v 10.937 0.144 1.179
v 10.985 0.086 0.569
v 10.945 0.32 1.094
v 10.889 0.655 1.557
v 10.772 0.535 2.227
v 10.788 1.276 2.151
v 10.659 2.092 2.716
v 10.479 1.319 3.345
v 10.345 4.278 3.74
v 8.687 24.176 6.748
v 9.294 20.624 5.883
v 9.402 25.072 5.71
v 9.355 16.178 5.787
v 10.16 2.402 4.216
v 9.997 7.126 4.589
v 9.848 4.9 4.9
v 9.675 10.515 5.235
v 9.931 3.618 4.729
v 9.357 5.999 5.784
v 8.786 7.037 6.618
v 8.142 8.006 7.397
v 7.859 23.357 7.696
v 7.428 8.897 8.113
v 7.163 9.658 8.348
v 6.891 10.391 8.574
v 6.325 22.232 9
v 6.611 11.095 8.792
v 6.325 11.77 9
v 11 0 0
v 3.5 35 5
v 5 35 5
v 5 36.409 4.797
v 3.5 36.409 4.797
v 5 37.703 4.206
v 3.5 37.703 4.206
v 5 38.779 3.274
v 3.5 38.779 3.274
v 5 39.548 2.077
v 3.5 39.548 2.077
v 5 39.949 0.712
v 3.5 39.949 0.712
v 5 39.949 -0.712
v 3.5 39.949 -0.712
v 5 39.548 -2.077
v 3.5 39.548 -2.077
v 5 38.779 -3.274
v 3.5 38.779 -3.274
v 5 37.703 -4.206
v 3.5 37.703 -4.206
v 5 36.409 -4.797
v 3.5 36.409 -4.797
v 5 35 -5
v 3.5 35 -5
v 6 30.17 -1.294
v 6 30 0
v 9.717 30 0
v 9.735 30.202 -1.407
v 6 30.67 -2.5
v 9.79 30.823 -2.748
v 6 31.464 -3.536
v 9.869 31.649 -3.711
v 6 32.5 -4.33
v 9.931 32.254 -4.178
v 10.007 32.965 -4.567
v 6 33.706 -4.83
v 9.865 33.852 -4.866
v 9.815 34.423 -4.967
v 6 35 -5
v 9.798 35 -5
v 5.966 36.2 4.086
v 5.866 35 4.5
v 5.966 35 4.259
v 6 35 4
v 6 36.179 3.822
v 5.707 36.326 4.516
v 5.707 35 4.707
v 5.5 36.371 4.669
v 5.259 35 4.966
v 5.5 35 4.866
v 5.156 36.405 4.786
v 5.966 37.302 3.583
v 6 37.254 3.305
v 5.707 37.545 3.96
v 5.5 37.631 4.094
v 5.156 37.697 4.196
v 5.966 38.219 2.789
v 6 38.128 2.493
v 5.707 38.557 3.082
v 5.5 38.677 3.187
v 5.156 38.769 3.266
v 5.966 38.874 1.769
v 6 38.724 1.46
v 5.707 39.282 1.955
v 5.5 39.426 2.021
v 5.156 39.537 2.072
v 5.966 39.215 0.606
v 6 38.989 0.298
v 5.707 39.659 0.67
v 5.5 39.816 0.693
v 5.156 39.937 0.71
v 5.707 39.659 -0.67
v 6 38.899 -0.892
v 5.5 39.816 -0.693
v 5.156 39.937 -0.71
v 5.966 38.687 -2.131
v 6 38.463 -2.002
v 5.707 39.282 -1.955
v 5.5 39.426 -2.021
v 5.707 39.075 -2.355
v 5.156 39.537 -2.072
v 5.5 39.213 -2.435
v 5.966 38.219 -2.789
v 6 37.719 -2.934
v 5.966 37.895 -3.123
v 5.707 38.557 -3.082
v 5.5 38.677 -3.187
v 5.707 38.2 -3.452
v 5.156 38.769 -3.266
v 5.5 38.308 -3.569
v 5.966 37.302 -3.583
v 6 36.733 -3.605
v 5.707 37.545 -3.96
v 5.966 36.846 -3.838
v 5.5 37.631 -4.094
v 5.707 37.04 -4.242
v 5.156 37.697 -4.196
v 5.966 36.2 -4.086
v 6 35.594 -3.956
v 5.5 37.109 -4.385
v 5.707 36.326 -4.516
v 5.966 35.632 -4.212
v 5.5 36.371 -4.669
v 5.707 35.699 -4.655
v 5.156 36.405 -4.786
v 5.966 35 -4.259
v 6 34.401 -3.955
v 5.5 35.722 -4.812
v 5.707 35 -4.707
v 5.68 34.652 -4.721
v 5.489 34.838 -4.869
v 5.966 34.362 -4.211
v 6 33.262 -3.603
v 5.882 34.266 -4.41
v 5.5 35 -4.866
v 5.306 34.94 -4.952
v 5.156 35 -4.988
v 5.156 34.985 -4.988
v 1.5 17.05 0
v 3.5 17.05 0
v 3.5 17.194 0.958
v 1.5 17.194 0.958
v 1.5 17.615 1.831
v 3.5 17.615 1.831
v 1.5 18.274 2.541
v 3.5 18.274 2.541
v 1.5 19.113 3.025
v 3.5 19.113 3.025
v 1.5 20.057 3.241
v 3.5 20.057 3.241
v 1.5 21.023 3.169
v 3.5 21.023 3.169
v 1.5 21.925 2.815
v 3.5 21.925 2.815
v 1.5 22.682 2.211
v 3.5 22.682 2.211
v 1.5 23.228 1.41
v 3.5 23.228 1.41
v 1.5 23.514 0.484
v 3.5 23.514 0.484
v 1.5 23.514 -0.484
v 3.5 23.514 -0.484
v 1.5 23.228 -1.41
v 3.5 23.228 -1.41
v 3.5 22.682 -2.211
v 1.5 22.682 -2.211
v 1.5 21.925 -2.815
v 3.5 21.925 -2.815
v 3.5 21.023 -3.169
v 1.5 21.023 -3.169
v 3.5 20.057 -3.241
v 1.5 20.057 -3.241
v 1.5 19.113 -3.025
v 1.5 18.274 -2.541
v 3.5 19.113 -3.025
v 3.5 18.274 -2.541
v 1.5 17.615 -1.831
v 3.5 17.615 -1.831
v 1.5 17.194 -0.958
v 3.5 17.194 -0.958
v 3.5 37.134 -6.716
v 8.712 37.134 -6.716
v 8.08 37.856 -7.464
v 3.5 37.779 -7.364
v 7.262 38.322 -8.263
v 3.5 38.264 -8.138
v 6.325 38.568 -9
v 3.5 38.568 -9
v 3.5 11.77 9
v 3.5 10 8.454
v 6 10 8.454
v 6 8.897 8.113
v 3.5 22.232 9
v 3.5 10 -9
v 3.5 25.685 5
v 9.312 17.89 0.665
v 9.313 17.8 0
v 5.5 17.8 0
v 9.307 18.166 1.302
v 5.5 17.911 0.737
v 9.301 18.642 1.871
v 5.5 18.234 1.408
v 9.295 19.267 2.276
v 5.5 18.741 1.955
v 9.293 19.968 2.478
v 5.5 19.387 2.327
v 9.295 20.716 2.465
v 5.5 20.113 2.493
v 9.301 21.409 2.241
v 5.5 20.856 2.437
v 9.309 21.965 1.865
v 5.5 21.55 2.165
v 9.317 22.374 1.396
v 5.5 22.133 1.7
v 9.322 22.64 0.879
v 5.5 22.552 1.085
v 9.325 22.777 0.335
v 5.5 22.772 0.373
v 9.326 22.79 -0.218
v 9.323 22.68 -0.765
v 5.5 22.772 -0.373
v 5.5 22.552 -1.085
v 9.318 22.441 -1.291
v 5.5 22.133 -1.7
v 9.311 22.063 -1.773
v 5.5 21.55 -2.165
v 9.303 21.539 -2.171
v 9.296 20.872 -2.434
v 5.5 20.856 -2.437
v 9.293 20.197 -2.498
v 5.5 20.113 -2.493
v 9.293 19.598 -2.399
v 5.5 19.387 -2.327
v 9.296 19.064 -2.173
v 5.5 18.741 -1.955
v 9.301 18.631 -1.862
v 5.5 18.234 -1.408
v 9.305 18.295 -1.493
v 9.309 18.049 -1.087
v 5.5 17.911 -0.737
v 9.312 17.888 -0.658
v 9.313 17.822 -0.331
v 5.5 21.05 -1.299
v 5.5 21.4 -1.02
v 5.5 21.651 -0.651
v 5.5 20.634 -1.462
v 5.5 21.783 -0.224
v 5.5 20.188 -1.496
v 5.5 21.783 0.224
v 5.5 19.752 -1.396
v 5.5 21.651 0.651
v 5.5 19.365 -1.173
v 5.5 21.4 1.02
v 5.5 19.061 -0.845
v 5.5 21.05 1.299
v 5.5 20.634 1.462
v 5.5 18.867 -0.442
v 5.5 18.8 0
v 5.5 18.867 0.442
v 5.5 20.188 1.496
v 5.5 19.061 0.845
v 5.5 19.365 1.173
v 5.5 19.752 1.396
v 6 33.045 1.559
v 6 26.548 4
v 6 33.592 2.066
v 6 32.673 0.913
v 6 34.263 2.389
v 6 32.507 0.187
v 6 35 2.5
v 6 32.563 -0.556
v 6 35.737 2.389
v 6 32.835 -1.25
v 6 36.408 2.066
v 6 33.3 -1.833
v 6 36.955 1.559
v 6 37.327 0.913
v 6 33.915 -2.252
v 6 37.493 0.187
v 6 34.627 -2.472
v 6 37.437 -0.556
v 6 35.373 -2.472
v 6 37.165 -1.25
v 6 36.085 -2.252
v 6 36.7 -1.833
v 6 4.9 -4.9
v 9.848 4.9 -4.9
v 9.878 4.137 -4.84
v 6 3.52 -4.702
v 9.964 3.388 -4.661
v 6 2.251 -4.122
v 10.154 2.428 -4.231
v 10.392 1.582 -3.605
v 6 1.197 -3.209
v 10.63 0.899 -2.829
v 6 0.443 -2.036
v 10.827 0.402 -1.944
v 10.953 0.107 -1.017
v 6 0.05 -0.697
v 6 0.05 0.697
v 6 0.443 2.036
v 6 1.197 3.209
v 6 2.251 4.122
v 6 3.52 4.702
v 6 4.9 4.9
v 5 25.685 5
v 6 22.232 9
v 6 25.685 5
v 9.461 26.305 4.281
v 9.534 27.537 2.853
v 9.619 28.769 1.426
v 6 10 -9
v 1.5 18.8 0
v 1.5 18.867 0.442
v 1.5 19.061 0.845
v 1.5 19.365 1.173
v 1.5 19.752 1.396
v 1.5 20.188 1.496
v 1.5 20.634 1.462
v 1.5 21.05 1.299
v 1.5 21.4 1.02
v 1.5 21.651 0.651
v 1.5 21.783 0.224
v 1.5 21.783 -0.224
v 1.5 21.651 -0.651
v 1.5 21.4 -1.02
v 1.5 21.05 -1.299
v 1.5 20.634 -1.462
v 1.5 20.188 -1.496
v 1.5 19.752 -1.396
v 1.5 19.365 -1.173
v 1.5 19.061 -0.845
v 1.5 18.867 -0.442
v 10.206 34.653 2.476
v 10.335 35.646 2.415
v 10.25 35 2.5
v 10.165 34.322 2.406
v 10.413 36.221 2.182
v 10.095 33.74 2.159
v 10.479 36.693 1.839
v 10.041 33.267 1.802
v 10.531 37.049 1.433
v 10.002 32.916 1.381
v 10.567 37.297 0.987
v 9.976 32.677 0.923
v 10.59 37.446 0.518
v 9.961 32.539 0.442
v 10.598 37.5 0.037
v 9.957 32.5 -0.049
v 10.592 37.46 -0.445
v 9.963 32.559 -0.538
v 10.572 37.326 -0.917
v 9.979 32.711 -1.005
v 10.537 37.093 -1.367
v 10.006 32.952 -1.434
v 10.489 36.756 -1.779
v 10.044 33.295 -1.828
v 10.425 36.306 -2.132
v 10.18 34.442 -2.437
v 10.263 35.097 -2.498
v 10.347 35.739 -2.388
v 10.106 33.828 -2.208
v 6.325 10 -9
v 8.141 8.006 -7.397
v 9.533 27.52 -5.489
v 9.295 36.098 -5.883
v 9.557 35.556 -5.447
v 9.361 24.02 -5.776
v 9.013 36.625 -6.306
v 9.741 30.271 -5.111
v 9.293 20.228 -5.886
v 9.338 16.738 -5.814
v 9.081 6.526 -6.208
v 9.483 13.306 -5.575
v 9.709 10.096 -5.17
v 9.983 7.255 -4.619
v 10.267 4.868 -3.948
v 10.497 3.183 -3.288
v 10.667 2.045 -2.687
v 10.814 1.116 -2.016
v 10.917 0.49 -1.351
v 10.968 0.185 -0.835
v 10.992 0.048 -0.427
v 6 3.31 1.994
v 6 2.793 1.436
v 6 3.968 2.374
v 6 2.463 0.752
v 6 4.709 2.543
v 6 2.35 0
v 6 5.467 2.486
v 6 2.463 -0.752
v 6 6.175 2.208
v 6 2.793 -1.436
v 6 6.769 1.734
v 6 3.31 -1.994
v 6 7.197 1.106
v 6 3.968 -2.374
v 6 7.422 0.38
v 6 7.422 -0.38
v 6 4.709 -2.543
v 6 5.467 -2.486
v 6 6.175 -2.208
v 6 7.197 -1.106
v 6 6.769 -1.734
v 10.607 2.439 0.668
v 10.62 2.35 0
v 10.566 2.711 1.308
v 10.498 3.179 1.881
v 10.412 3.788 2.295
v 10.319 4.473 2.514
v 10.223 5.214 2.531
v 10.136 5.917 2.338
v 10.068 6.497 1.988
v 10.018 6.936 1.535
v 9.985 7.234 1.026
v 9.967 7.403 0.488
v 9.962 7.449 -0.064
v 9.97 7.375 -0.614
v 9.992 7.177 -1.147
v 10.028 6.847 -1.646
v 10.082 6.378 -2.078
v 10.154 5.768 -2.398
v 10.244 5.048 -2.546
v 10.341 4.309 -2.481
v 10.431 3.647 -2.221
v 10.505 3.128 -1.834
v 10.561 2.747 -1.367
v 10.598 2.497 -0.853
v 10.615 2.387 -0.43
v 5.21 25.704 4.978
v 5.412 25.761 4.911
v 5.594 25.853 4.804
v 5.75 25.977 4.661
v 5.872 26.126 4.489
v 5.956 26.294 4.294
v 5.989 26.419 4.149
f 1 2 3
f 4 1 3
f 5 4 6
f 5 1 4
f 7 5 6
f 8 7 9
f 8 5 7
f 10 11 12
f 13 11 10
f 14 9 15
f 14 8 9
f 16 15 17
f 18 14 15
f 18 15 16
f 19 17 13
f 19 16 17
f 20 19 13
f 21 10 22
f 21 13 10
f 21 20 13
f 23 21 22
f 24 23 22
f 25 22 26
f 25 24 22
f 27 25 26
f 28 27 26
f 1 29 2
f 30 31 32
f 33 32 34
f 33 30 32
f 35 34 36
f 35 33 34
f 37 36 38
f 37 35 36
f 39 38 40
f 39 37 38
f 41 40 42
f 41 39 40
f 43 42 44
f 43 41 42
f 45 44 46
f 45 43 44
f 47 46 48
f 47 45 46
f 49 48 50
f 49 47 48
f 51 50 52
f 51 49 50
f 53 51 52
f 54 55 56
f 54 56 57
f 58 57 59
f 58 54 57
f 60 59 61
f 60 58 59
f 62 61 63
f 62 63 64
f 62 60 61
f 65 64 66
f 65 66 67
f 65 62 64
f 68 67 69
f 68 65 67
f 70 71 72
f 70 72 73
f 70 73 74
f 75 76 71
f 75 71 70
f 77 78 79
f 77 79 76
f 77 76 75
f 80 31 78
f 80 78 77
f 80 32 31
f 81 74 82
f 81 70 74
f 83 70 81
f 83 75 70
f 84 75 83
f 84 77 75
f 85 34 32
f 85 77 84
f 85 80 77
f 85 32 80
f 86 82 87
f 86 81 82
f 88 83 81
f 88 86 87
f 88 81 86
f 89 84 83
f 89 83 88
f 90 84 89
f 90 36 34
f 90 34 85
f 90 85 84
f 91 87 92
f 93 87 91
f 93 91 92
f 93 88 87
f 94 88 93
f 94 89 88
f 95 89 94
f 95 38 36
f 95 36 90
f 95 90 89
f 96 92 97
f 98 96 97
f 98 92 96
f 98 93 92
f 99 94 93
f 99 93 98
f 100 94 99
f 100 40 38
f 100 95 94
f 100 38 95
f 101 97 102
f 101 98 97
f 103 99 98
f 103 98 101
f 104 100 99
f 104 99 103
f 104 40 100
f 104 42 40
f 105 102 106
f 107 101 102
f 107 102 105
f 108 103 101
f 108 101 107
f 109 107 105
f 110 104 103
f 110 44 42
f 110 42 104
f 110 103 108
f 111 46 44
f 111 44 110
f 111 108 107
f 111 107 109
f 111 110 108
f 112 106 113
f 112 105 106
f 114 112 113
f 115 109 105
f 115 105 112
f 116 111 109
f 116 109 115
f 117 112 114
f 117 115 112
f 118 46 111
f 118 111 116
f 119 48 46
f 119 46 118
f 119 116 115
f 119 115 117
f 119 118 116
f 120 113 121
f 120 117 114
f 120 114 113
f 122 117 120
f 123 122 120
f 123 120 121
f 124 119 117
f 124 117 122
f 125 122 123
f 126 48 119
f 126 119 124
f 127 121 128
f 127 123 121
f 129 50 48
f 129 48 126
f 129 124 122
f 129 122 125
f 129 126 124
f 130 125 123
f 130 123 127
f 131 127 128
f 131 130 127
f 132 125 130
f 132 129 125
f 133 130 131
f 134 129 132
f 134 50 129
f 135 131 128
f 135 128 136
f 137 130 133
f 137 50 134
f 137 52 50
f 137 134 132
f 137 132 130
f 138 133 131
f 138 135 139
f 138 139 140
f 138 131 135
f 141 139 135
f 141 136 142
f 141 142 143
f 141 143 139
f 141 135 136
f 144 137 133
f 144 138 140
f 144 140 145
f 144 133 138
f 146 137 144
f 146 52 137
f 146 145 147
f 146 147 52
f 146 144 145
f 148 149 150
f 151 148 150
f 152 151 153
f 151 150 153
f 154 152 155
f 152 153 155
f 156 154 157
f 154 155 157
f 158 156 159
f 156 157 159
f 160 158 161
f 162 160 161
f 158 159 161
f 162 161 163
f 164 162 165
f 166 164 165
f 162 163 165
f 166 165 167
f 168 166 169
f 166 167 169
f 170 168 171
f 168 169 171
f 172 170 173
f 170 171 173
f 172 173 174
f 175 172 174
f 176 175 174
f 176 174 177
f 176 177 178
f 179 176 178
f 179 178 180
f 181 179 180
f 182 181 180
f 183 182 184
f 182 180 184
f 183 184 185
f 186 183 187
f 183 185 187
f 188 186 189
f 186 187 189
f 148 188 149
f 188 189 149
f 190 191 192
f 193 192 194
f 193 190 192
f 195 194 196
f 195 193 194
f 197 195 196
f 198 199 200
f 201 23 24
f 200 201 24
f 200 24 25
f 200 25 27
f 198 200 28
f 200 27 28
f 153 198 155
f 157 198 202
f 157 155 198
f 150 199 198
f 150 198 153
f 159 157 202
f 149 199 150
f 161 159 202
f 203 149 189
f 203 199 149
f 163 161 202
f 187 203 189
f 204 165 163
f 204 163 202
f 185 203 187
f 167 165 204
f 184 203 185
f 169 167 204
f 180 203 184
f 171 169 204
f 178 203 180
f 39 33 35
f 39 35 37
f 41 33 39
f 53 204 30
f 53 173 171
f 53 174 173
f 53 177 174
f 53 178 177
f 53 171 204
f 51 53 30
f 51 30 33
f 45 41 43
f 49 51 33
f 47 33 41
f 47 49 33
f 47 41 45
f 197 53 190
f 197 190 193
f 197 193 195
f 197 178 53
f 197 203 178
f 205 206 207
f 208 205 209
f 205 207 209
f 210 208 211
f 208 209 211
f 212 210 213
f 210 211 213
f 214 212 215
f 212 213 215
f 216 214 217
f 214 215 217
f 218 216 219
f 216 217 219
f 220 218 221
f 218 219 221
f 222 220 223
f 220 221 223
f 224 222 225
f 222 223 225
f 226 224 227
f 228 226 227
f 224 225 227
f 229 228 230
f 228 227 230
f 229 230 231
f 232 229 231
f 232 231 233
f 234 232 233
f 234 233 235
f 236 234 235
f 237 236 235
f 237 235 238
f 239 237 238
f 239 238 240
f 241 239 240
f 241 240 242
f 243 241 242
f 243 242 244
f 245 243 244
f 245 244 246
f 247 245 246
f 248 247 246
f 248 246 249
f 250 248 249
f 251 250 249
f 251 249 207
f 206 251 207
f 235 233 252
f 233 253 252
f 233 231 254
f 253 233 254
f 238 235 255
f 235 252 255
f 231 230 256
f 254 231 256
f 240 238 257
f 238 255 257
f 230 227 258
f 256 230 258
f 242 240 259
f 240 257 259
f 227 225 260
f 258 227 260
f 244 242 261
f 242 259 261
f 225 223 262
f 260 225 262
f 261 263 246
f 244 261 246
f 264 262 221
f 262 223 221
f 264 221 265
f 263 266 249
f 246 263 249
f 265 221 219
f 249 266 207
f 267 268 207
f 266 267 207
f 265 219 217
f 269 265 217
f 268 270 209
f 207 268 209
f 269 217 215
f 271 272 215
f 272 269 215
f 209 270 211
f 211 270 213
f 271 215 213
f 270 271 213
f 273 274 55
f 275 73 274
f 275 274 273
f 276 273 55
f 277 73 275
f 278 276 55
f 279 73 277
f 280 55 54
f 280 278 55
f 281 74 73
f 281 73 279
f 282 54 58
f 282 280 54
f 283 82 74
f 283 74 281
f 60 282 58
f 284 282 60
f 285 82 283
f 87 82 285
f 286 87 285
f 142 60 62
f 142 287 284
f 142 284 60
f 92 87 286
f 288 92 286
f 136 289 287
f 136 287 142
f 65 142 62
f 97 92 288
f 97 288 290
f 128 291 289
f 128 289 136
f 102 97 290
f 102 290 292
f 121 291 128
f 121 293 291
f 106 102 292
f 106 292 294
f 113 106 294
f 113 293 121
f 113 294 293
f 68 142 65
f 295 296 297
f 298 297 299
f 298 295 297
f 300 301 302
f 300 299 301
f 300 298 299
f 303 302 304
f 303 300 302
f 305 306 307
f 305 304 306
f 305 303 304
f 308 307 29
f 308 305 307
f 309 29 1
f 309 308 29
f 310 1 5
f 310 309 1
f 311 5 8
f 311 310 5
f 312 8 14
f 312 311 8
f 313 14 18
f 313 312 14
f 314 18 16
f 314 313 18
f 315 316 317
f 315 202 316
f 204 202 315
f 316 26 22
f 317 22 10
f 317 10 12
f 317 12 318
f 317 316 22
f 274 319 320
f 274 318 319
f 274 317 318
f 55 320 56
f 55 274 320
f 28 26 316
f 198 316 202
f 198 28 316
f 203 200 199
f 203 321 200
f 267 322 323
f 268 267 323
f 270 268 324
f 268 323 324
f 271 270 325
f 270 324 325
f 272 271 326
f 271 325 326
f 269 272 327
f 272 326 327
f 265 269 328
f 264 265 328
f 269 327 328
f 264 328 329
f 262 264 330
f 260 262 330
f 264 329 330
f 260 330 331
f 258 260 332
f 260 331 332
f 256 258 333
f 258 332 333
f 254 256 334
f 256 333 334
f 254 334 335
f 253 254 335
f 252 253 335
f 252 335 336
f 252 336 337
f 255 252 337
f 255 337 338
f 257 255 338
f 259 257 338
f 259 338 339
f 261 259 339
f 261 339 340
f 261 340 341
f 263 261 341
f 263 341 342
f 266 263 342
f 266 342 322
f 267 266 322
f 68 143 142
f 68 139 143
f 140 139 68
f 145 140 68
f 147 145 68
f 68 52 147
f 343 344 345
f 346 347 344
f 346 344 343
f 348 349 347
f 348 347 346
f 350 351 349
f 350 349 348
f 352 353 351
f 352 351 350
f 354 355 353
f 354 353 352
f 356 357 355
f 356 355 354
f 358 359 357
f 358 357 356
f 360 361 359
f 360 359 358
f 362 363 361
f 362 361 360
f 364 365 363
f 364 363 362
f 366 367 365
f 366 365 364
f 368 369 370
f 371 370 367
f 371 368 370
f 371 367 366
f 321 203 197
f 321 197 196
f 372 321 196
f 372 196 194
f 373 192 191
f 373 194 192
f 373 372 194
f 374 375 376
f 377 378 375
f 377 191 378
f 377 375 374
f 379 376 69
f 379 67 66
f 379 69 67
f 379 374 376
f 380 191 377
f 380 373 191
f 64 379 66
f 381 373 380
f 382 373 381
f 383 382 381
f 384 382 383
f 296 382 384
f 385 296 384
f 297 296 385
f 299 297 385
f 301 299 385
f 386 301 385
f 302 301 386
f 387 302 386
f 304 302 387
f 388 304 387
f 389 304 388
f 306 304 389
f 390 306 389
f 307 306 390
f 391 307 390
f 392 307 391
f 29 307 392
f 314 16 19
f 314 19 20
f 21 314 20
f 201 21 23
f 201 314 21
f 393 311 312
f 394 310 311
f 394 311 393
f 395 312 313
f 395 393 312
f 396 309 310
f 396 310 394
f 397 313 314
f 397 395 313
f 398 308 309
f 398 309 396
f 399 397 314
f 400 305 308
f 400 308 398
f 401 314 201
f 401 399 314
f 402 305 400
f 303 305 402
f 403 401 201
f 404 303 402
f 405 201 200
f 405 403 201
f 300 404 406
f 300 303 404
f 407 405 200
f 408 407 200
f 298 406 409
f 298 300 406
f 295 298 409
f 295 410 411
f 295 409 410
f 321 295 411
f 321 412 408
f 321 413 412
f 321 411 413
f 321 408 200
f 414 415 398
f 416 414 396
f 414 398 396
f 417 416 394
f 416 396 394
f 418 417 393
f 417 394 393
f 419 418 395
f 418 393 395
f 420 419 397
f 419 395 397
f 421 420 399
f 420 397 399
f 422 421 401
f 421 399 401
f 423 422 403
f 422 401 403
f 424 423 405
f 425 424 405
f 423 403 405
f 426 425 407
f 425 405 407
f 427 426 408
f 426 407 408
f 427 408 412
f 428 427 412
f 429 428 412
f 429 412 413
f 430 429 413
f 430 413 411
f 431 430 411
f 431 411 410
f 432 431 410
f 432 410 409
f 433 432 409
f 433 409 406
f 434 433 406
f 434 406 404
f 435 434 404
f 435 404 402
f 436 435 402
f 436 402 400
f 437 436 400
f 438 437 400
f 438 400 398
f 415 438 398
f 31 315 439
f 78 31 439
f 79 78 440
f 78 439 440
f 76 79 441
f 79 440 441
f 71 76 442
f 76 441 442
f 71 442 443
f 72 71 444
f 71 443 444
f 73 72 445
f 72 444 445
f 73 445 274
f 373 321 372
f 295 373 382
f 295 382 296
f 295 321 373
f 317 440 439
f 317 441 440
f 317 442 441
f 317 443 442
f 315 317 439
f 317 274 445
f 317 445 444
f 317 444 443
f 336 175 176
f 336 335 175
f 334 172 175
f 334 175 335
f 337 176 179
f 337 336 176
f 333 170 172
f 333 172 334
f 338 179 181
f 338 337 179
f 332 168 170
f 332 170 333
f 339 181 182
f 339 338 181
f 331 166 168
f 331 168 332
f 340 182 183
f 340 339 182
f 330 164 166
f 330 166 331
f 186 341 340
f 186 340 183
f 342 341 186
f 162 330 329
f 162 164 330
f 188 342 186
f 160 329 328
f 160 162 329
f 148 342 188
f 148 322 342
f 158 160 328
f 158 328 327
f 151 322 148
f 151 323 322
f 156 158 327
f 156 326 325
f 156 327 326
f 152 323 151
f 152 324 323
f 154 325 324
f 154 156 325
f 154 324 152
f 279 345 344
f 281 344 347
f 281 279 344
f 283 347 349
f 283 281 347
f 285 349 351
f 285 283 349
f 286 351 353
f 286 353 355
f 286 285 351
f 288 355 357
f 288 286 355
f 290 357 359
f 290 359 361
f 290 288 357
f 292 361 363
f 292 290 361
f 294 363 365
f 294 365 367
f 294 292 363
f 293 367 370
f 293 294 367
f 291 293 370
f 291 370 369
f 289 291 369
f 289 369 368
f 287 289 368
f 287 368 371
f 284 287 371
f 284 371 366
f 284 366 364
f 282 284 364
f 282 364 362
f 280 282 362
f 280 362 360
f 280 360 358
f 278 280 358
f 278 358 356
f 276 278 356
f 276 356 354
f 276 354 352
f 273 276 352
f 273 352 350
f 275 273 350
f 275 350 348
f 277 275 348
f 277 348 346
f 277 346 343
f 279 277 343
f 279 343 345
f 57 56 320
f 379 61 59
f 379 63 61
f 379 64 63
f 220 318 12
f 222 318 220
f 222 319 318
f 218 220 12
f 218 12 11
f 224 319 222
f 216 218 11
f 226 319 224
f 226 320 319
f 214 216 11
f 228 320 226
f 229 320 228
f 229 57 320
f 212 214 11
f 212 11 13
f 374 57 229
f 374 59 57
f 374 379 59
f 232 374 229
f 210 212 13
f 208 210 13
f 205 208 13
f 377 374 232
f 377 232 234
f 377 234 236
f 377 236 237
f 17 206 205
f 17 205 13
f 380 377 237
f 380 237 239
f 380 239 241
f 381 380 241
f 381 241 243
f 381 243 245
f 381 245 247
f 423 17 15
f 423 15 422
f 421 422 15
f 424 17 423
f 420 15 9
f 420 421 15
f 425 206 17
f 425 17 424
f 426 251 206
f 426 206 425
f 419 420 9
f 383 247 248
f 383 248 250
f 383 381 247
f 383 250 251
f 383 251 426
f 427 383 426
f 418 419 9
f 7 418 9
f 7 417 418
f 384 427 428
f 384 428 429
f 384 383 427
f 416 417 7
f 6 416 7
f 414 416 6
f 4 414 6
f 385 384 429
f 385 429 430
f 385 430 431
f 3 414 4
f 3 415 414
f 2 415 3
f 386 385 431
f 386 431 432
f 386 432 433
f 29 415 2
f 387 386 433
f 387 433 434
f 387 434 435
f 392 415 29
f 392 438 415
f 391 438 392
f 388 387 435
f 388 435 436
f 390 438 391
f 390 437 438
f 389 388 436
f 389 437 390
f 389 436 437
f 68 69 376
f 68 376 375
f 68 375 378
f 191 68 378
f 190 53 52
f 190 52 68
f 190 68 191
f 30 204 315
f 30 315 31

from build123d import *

# Parameters (mm, degrees)
BOSS_EXTRUDE1_DEPTH      = 40
CUT_EXTRUDE1_DEPTH       = 45
CUT_EXTRUDE2_REACH       = 47.222
SKETCH3_W                = 12
SKETCH3_H                = 10
SKETCH4_R                = 2.55
CUT_EXTRUDE3_DEPTH       = 17.5
FILLET4_R                = 2
CUT_EXTRUDE5_START       = -12.324555
SKETCH6_R                = 2.5
CUT_EXTRUDE5_DEPTH       = 9.6
CUT_EXTRUDE6_START       = 6.279445
SKETCH6_3_R              = 2.5
CUT_EXTRUDE6_DEPTH       = 6.604
CUT_EXTRUDE7_START       = -14.986
CUT_EXTRUDE7_DEPTH       = 14.986
CUT_EXTRUDE14_DEPTH      = 10
CUT_EXTRUDE14_DEPTH_BACK = 20
FILLET3_R                = 1
CUT_EXTRUDE17_DEPTH      = 9
CUT_EXTRUDE17_DEPTH_BACK = 31
SKETCH19_W               = 34.391960709
SKETCH19_H               = 80.468832088
SKETCH20_R               = 3.25
BOSS_EXTRUDE2_DEPTH      = 2
SKETCH21_R               = 1.5
CUT_EXTRUDE18_DEPTH      = 14
CUT_EXTRUDE19_START      = -4
SKETCH22_R               = 2.5
CUT_EXTRUDE19_DEPTH      = 14
CUT_EXTRUDE20_DEPTH      = 14
CUT_EXTRUDE20_DEPTH_BACK = 14


with BuildPart() as part:
    # Sketch1 → Boss-Extrude1 (new body)
    with BuildSketch(Plane(origin=(0, 0, 0), x_dir=(1, 0, 0), z_dir=(0, 1, 0))):
        with BuildLine():
            Line((-6.32455532, 9), (6.32455532, 9))
            ThreePointArc((6.32455532, 9), (11, 0), (6.32455532, -9))
            Line((6.32455532, -9), (-6.32455532, -9))
            ThreePointArc((-6.32455532, -9), (-11, 0), (-6.32455532, 9))
        make_face()
    extrude(amount=BOSS_EXTRUDE1_DEPTH)

    # Sketch2 → Cut-Extrude1 (cut)
    with BuildSketch(Plane.XZ):
        with BuildLine():
            Line((1.5, 5), (-1.5, 5))
            ThreePointArc((-1.5, 5), (0, 6.5), (1.5, 5))
        make_face()
        with BuildLine():
            Line((1.5, -5), (-1.5, -5))
            ThreePointArc((-1.5, -5), (0, -6.5), (1.5, -5))
        make_face()
    extrude(amount=-CUT_EXTRUDE1_DEPTH, mode=Mode.SUBTRACT)

    # Cut-Extrude2: up to this face of the body (flat: up to its plane)
    cut_extrude2_end = Plane(part.part.faces().sort_by_distance((0, 20, 9))[0])
    # Sketch3 → Cut-Extrude2 (cut, up to the picked face)
    with BuildSketch(Plane(origin=(0, 0, -9), x_dir=(-1, 0, 0), z_dir=(0, 0, -1)), mode=Mode.PRIVATE) as cut_extrude2_sk1:
        with Locations((0, 5)):
            Rectangle(SKETCH3_W, SKETCH3_H)
    cut_extrude2_tool1 = split(extrude(cut_extrude2_sk1.sketch, amount=-CUT_EXTRUDE2_REACH, mode=Mode.PRIVATE), bisect_by=cut_extrude2_end, keep=Keep.BOTH, mode=Mode.PRIVATE)
    add(cut_extrude2_tool1.solids().sort_by(Axis((0, 5, -9), (0, 0, 1)))[0], mode=Mode.SUBTRACT)

    # Sketch4 → Cut-Extrude3 (cut, symmetric)
    with BuildSketch(Plane.ZY.offset(-6)):
        with Locations(Location((0, 4.9, 0), (0, 0, 270))):
            Circle(SKETCH4_R)
        with BuildLine():
            Line((-9, 10), (-4.9, 4.9))
            ThreePointArc((-4.9, 4.9), (0, 0), (4.9, 4.9))
            Line((4.9, 4.9), (9, 10))
            Line((9, 10), (12.043777938, -1.930413563))
            Line((12.043777938, -1.930413563), (-10.290438773, -1.930413563))
            Line((-10.290438773, -1.930413563), (-9, 10))
        make_face()
    extrude(amount=CUT_EXTRUDE3_DEPTH, both=True, mode=Mode.SUBTRACT)

    # Fillet4
    fillet4_edges = [part.edges().sort_by_distance(p)[0] for p in [
        (0, 10, 5),
        (0, 10, 6.5),
        (0, 10, -5),
        (0, 10, -6.5),
    ]]
    fillet(fillet4_edges, radius=FILLET4_R)

    # Sketch6 → Cut-Extrude5 (cut)
    with BuildSketch(Plane.ZY.offset(6.32455532).offset(CUT_EXTRUDE5_START)):
        with BuildLine():
            Line((9, 22.232353468), (0, 30))
            ThreePointArc((0, 30), (-3.535533906, 31.464466094), (-5, 35))
            Line((-5, 35), (-6.715621335, 37.134065563))
            ThreePointArc((-6.715621335, 37.134065563), (-7.737273484, 38.043034193), (-9, 38.567933069))
            Line((-9, 38.567933069), (-20.985236203, 70.297327945))
            Line((-20.985236203, 70.297327945), (29.827478779, 37.594689174))
            Line((29.827478779, 37.594689174), (9, 22.232353468))
        make_face()
        with Locations((0, 35)):
            Circle(SKETCH6_R, mode=Mode.SUBTRACT)
    extrude(amount=-CUT_EXTRUDE5_DEPTH, mode=Mode.SUBTRACT)

    # Sketch6<3> → Cut-Extrude6 (cut)
    with BuildSketch(Plane.ZY.offset(6.32455532).offset(CUT_EXTRUDE6_START)):
        with BuildLine():
            Line((9, 22.232353468), (0, 30))
            ThreePointArc((0, 30), (-3.535533906, 31.464466094), (-5, 35))
            Line((-5, 35), (-6.715621335, 37.134065563))
            ThreePointArc((-6.715621335, 37.134065563), (-7.737273484, 38.043034193), (-9, 38.567933069))
            Line((-9, 38.567933069), (-20.985236203, 70.297327945))
            Line((-20.985236203, 70.297327945), (29.827478779, 37.594689174))
            Line((29.827478779, 37.594689174), (9, 22.232353468))
        make_face()
        with Locations((0, 35)):
            Circle(SKETCH6_3_R, mode=Mode.SUBTRACT)
    extrude(amount=-CUT_EXTRUDE6_DEPTH, mode=Mode.SUBTRACT)

    # Sketch7 → Cut-Extrude7 (cut)
    with BuildSketch(Plane(origin=(6, 0, 0), x_dir=(0, 0, -1), z_dir=(1, 0, 0)).offset(CUT_EXTRUDE7_START)):
        with BuildLine():
            Line((5, 35), (6.715621335, 37.134065563))
            ThreePointArc((6.715621335, 37.134065563), (7.737273484, 38.043034193), (9, 38.567933069))
            Line((9, 38.567933069), (17.905522107, 46.18977372))
            Line((17.905522107, 46.18977372), (-20.628346566, 40.15215478))
            Line((-20.628346566, 40.15215478), (-9, 22.232353468))
            Line((-9, 22.232353468), (-5, 25.684640815))
            Line((-5, 25.684640815), (-5, 35))
            ThreePointArc((-5, 35), (0, 40), (5, 35))
        make_face()
    extrude(amount=CUT_EXTRUDE7_DEPTH, mode=Mode.SUBTRACT)

    # Sketch16 → Cut-Extrude14 (cut, two sides: drawn at the far end of the back side and taken through both)
    with BuildSketch(Plane.ZY.offset(6.32455532).offset(-CUT_EXTRUDE14_DEPTH_BACK)):
        Polygon((8.113259987, 8.896981935), (11.550119513, 20.031417135), (18.056002312, 15.695207893), (16.156055326, 2.281594324), align=None)
    extrude(amount=CUT_EXTRUDE14_DEPTH + CUT_EXTRUDE14_DEPTH_BACK, mode=Mode.SUBTRACT)

    # Fillet3
    # the kernel refuses this fillet: 1 mm, written as the material it takes off along each edge
    with BuildSketch(Plane(origin=(5.99999968, 23.184640014, 5), x_dir=(-1, 0, 0), z_dir=(0, 1, 0))) as fillet3_piece_1_section:
        with BuildLine():
            CenterArc((FILLET3_R, -FILLET3_R), FILLET3_R, 90, 90)
            Line((0, -FILLET3_R), (0, 0))
            Line((0, 0), (FILLET3_R, 0))
        make_face()
    fillet3_piece_1 = extrude(amount=11.815359986, mode=Mode.PRIVATE)
    fillet3_piece_1 = split(fillet3_piece_1, bisect_by=Plane(origin=(5.764976342, 27.542151825, 2.84779096), z_dir=(0, 0.7570343753275036, 0.6533750489362878)), keep=Keep.TOP, mode=Mode.PRIVATE)
    add(fillet3_piece_1, mode=Mode.SUBTRACT)
    with BuildSketch(Plane(origin=(6, 35, 0), x_dir=(0, 0, 1), z_dir=(0, -1, 0))) as fillet3_piece_2_section:
        with BuildLine():
            CenterArc((4, 1.00000032), FILLET3_R, 270, 90)
            ThreePointArc((4, 3.2e-07), (4.5, 3.2e-07), (5, 0))
            Line((5, 0), (5, 1.00000032))
        make_face()
    fillet3_piece_2 = revolve(axis=Axis((6, 35, 0), (-1, 0, 0)), revolution_arc=208.693968336, mode=Mode.PRIVATE)
    fillet3_piece_2 = split(fillet3_piece_2, bisect_by=Plane(origin=(5.717618036, 35.865387036, -5.695703303), z_dir=(0, 0.6265569118246621, 0.7793756708062823)), keep=Keep.TOP, mode=Mode.PRIVATE)
    add(fillet3_piece_2, mode=Mode.SUBTRACT)
    with BuildSketch(Plane(origin=(-6.00000032, 35, 0), x_dir=(0, -0.48013104288571345, -0.8771967747646346), z_dir=(0, -0.8771967747646346, 0.48013104288571345))) as fillet3_piece_3_section:
        with BuildLine():
            CenterArc((5 - FILLET3_R, FILLET3_R), FILLET3_R, 270, 90)
            Line((5 - FILLET3_R, 0), (5, 0))
            Line((5, 0), (5, FILLET3_R))
        make_face()
    fillet3_piece_3 = revolve(axis=Axis((-6.00000032, 35, 0), (1, 0, 0)), revolution_arc=208.69396098, mode=Mode.PRIVATE)
    fillet3_piece_3 = split(fillet3_piece_3, bisect_by=Plane(origin=(-5.717618693, 35.865387047, -5.695703312), z_dir=(0, 0.6265569118246621, 0.7793756708062823)), keep=Keep.TOP, mode=Mode.PRIVATE)
    add(fillet3_piece_3, mode=Mode.SUBTRACT)
    with BuildSketch(Plane(origin=(-6.00000032, 35, 5), x_dir=(0, 0, -1), z_dir=(0, -1, 0))) as fillet3_piece_4_section:
        with BuildLine():
            CenterArc((FILLET3_R, FILLET3_R), FILLET3_R, 180, 90)
            Line((0, FILLET3_R), (0, 0))
            Line((0, 0), (FILLET3_R, 0))
        make_face()
    fillet3_piece_4 = extrude(amount=11.815359185, mode=Mode.PRIVATE)
    fillet3_piece_4 = split(fillet3_piece_4, bisect_by=Plane(origin=(-5.831638788, 29.468233541, 0.616132326), z_dir=(0, 0.7570343753275036, 0.6533750489362878)), keep=Keep.TOP, mode=Mode.PRIVATE)
    add(fillet3_piece_4, mode=Mode.SUBTRACT)

    # Sketch19 → Cut-Extrude17 (cut, two sides: drawn at the far end of the back side and taken through both)
    with BuildSketch(Plane.XY.offset(5).offset(-CUT_EXTRUDE17_DEPTH_BACK)):
        with Locations((-13.695980355, 34.702359308)):
            Rectangle(SKETCH19_W, SKETCH19_H)
    extrude(amount=CUT_EXTRUDE17_DEPTH + CUT_EXTRUDE17_DEPTH_BACK, mode=Mode.SUBTRACT)

    # Sketch20 → Boss-Extrude2 (add)
    with BuildSketch(Plane.ZY.offset(-3.5)):
        with Locations(Location((0, 20.3, 0), (0, 0, 270))):
            Circle(SKETCH20_R)
    extrude(amount=BOSS_EXTRUDE2_DEPTH)

    # Sketch21 → Cut-Extrude18 (cut)
    with BuildSketch(Plane.ZY.offset(-1.5)):
        with Locations(Location((0, 20.3, 0), (0, 0, 270))):
            Circle(SKETCH21_R)
    extrude(amount=-CUT_EXTRUDE18_DEPTH, mode=Mode.SUBTRACT)

    # Sketch22 → Cut-Extrude19 (cut)
    with BuildSketch(Plane.ZY.offset(-1.5).offset(CUT_EXTRUDE19_START)):
        with Locations(Location((0, 20.3, 0), (0, 0, 270))):
            Circle(SKETCH22_R)
    extrude(amount=-CUT_EXTRUDE19_DEPTH, mode=Mode.SUBTRACT)

    # Sketch17 → Cut-Extrude20 (cut, two sides: drawn at the far end of the back side and taken through both)
    with BuildSketch(Plane.XY.offset(-CUT_EXTRUDE20_DEPTH_BACK)):
        with BuildLine():
            Line((11, 0), (25.575472319, 70.054686952))
            Line((25.575472319, 70.054686952), (-19.116979593, 73.080460091))
            Line((-19.116979593, 73.080460091), (-22.103338511, 10.056999989))
            Line((-22.103338511, 10.056999989), (-11, 0))
            ThreePointArc((-11, 0), (-9.292734081, 20), (-11, 40))
            Line((-11, 40), (-11, 54.709335657))
            Line((-11, 54.709335657), (1.039161205, 61.782229983))
            Line((1.039161205, 61.782229983), (17.277292868, 53.927851901))
            Line((17.277292868, 53.927851901), (11, 40))
            ThreePointArc((11, 40), (9.292734081, 20), (11, 0))
        make_face()
    extrude(amount=CUT_EXTRUDE20_DEPTH + CUT_EXTRUDE20_DEPTH_BACK, mode=Mode.SUBTRACT)


solid = part.part
